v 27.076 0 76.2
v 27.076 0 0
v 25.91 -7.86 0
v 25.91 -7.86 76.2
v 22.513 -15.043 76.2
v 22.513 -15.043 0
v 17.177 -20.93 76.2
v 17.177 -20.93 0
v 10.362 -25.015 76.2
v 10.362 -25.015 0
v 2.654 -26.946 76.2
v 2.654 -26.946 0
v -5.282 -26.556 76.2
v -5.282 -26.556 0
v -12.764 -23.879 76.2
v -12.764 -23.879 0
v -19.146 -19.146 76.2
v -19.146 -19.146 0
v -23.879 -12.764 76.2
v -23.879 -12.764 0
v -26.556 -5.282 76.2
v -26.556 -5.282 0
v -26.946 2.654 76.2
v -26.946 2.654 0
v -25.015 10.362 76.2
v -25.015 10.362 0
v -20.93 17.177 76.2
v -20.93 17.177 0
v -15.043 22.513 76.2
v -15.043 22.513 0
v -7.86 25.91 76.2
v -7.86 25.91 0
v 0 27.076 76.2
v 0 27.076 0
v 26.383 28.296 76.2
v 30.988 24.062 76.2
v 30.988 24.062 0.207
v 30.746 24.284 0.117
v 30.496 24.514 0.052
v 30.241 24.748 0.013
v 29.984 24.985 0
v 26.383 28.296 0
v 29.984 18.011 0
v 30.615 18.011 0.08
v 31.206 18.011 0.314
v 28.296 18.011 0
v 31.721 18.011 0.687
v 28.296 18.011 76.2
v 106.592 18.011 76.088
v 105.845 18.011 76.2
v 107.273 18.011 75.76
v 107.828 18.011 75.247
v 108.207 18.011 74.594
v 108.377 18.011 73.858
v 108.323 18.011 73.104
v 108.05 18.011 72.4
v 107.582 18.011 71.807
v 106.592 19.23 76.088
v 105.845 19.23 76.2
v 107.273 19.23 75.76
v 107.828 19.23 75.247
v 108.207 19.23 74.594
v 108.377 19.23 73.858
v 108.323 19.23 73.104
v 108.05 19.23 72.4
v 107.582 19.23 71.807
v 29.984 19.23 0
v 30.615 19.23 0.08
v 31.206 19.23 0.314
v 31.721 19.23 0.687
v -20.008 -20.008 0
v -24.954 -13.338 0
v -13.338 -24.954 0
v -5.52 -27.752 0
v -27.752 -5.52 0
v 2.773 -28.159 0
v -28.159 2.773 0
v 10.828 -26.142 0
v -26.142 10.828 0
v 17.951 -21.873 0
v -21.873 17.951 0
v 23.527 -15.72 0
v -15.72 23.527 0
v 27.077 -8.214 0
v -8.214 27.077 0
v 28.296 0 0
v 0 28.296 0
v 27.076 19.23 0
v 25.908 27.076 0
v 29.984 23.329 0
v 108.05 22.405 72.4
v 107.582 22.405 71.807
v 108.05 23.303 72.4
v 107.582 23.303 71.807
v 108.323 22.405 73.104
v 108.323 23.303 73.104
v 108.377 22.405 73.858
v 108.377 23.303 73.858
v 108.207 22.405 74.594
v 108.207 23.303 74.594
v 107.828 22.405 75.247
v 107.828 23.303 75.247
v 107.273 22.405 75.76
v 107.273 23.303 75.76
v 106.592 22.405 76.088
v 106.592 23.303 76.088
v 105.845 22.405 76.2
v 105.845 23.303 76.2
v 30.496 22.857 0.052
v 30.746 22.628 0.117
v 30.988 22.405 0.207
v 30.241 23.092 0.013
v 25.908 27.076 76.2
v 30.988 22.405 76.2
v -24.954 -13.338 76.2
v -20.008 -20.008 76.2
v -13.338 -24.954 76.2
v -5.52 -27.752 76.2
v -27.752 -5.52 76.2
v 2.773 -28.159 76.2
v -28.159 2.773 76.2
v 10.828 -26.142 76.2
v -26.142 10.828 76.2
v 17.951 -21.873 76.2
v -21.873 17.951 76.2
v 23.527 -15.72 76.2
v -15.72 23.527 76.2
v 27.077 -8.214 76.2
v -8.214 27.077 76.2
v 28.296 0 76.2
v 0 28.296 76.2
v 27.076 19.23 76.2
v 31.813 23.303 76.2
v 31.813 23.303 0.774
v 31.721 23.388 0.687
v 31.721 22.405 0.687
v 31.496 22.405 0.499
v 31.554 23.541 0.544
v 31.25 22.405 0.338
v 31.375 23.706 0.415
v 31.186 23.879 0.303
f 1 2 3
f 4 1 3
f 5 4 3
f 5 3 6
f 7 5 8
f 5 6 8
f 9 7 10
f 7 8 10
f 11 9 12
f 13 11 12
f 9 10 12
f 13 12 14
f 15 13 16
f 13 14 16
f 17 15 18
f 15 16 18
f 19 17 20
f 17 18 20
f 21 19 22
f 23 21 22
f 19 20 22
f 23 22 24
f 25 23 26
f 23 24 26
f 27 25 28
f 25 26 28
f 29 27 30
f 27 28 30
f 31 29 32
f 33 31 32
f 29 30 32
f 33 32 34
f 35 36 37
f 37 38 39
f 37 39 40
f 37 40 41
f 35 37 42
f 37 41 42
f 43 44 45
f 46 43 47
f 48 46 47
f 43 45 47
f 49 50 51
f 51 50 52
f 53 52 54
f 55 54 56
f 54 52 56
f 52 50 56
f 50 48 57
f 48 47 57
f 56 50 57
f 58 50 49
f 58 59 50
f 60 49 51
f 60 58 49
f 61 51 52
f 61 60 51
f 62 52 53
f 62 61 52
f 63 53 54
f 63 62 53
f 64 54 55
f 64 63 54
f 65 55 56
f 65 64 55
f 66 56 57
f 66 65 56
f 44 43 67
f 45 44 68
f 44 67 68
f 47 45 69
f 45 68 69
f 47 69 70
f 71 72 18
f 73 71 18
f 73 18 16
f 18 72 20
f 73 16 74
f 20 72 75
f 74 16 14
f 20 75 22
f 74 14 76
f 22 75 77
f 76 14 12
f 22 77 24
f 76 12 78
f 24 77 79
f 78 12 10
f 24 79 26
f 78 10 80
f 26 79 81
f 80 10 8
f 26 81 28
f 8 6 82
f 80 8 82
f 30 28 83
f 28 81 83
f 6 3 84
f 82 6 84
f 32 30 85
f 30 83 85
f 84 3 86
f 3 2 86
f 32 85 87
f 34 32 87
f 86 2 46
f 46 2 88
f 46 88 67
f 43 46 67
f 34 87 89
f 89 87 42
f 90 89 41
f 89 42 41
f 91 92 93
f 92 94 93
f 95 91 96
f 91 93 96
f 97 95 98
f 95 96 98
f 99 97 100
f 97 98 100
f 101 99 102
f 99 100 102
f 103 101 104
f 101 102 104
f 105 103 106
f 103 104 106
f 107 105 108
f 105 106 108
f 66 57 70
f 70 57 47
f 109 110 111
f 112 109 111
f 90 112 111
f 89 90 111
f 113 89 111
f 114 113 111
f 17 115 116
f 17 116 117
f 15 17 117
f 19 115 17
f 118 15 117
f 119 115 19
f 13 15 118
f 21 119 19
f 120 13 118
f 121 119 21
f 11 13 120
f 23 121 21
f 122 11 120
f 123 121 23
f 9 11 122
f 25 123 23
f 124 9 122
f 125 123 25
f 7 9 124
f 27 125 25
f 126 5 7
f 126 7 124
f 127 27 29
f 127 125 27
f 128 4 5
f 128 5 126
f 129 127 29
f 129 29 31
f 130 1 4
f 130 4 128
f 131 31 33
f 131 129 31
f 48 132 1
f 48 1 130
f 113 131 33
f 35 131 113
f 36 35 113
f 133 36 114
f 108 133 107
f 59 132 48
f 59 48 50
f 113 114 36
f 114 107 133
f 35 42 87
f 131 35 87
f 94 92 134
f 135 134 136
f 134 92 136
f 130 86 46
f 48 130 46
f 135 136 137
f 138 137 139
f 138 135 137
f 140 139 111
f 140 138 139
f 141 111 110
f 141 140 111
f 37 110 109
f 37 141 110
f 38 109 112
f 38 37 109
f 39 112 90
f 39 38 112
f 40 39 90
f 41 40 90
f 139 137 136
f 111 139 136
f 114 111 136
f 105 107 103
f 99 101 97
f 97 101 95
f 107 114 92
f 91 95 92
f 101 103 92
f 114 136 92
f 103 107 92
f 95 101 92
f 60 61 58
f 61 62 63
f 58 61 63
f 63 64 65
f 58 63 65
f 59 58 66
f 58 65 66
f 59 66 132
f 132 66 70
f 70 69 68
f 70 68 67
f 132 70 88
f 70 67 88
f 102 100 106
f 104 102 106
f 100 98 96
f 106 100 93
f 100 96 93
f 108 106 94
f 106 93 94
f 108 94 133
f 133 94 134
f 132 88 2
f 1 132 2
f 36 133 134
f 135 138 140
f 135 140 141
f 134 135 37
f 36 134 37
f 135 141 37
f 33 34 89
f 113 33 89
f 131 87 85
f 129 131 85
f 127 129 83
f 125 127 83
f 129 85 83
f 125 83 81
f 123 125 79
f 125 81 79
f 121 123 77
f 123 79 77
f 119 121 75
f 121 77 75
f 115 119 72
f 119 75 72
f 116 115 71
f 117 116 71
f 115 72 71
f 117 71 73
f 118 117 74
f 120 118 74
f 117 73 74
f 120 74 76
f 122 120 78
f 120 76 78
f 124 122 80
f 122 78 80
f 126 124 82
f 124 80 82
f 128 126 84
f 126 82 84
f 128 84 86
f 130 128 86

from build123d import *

# Parameters (mm, degrees)
BOSS_EXTRUDE1_DEPTH = 76.2
CUT_EXTRUDE1_DEPTH  = 144.369655065
FILLET1_R           = 2.54


with BuildPart() as part:
    # Sketch2 → Boss-Extrude1 (new body)
    with BuildSketch(Plane.XY):
        Polygon((31.81322426, 23.302810647), (30.988, 24.061604353), (30.988, 22.40534), (112.268, 22.40534), (112.268, 23.302810647), align=None)
        with BuildLine():
            Line((30.988, 22.40534), (30.988, 24.061604353))
            Line((30.988, 24.061604353), (26.38332828, 28.2956))
            Line((26.38332828, 28.2956), (0, 28.2956))
            ThreePointArc((0, 28.2956), (-20.008010638, -20.008010638), (28.2956, 0))
            Line((28.2956, 0), (28.2956, 18.01114))
            Line((28.2956, 18.01114), (112.268, 18.01114))
            Line((112.268, 18.01114), (112.268, 19.23034))
            Line((112.268, 19.23034), (30.988, 19.23034))
            Line((30.988, 19.23034), (27.0764, 19.23034))
            Line((27.0764, 19.23034), (27.0764, 0))
            ThreePointArc((27.0764, 0), (-19.14590605, -19.14590605), (0, 27.0764))
            Line((0, 27.0764), (25.908, 27.0764))
            Line((25.908, 27.0764), (30.988, 22.40534))
        make_face()
    extrude(amount=BOSS_EXTRUDE1_DEPTH)

    # Sketch3 → Cut-Extrude1 (cut, through all)
    with BuildSketch(Plane.XZ.offset(-18.01114)):
        Polygon((112.268, 76.2), (30.988, 0), (112.268, 0), align=None)
    extrude(amount=-CUT_EXTRUDE1_DEPTH, mode=Mode.SUBTRACT)

    # Fillet1
    fillet1_edges = [part.edges().sort_by_distance(p)[0] for p in [
        (112.268, 18.62074, 76.2),
        (30.988, 18.62074, 0),
        (30.988, 23.233472177, 0),
        (112.268, 22.854075323, 76.2),
    ]]
    fillet(fillet1_edges, radius=FILLET1_R)


solid = part.part
